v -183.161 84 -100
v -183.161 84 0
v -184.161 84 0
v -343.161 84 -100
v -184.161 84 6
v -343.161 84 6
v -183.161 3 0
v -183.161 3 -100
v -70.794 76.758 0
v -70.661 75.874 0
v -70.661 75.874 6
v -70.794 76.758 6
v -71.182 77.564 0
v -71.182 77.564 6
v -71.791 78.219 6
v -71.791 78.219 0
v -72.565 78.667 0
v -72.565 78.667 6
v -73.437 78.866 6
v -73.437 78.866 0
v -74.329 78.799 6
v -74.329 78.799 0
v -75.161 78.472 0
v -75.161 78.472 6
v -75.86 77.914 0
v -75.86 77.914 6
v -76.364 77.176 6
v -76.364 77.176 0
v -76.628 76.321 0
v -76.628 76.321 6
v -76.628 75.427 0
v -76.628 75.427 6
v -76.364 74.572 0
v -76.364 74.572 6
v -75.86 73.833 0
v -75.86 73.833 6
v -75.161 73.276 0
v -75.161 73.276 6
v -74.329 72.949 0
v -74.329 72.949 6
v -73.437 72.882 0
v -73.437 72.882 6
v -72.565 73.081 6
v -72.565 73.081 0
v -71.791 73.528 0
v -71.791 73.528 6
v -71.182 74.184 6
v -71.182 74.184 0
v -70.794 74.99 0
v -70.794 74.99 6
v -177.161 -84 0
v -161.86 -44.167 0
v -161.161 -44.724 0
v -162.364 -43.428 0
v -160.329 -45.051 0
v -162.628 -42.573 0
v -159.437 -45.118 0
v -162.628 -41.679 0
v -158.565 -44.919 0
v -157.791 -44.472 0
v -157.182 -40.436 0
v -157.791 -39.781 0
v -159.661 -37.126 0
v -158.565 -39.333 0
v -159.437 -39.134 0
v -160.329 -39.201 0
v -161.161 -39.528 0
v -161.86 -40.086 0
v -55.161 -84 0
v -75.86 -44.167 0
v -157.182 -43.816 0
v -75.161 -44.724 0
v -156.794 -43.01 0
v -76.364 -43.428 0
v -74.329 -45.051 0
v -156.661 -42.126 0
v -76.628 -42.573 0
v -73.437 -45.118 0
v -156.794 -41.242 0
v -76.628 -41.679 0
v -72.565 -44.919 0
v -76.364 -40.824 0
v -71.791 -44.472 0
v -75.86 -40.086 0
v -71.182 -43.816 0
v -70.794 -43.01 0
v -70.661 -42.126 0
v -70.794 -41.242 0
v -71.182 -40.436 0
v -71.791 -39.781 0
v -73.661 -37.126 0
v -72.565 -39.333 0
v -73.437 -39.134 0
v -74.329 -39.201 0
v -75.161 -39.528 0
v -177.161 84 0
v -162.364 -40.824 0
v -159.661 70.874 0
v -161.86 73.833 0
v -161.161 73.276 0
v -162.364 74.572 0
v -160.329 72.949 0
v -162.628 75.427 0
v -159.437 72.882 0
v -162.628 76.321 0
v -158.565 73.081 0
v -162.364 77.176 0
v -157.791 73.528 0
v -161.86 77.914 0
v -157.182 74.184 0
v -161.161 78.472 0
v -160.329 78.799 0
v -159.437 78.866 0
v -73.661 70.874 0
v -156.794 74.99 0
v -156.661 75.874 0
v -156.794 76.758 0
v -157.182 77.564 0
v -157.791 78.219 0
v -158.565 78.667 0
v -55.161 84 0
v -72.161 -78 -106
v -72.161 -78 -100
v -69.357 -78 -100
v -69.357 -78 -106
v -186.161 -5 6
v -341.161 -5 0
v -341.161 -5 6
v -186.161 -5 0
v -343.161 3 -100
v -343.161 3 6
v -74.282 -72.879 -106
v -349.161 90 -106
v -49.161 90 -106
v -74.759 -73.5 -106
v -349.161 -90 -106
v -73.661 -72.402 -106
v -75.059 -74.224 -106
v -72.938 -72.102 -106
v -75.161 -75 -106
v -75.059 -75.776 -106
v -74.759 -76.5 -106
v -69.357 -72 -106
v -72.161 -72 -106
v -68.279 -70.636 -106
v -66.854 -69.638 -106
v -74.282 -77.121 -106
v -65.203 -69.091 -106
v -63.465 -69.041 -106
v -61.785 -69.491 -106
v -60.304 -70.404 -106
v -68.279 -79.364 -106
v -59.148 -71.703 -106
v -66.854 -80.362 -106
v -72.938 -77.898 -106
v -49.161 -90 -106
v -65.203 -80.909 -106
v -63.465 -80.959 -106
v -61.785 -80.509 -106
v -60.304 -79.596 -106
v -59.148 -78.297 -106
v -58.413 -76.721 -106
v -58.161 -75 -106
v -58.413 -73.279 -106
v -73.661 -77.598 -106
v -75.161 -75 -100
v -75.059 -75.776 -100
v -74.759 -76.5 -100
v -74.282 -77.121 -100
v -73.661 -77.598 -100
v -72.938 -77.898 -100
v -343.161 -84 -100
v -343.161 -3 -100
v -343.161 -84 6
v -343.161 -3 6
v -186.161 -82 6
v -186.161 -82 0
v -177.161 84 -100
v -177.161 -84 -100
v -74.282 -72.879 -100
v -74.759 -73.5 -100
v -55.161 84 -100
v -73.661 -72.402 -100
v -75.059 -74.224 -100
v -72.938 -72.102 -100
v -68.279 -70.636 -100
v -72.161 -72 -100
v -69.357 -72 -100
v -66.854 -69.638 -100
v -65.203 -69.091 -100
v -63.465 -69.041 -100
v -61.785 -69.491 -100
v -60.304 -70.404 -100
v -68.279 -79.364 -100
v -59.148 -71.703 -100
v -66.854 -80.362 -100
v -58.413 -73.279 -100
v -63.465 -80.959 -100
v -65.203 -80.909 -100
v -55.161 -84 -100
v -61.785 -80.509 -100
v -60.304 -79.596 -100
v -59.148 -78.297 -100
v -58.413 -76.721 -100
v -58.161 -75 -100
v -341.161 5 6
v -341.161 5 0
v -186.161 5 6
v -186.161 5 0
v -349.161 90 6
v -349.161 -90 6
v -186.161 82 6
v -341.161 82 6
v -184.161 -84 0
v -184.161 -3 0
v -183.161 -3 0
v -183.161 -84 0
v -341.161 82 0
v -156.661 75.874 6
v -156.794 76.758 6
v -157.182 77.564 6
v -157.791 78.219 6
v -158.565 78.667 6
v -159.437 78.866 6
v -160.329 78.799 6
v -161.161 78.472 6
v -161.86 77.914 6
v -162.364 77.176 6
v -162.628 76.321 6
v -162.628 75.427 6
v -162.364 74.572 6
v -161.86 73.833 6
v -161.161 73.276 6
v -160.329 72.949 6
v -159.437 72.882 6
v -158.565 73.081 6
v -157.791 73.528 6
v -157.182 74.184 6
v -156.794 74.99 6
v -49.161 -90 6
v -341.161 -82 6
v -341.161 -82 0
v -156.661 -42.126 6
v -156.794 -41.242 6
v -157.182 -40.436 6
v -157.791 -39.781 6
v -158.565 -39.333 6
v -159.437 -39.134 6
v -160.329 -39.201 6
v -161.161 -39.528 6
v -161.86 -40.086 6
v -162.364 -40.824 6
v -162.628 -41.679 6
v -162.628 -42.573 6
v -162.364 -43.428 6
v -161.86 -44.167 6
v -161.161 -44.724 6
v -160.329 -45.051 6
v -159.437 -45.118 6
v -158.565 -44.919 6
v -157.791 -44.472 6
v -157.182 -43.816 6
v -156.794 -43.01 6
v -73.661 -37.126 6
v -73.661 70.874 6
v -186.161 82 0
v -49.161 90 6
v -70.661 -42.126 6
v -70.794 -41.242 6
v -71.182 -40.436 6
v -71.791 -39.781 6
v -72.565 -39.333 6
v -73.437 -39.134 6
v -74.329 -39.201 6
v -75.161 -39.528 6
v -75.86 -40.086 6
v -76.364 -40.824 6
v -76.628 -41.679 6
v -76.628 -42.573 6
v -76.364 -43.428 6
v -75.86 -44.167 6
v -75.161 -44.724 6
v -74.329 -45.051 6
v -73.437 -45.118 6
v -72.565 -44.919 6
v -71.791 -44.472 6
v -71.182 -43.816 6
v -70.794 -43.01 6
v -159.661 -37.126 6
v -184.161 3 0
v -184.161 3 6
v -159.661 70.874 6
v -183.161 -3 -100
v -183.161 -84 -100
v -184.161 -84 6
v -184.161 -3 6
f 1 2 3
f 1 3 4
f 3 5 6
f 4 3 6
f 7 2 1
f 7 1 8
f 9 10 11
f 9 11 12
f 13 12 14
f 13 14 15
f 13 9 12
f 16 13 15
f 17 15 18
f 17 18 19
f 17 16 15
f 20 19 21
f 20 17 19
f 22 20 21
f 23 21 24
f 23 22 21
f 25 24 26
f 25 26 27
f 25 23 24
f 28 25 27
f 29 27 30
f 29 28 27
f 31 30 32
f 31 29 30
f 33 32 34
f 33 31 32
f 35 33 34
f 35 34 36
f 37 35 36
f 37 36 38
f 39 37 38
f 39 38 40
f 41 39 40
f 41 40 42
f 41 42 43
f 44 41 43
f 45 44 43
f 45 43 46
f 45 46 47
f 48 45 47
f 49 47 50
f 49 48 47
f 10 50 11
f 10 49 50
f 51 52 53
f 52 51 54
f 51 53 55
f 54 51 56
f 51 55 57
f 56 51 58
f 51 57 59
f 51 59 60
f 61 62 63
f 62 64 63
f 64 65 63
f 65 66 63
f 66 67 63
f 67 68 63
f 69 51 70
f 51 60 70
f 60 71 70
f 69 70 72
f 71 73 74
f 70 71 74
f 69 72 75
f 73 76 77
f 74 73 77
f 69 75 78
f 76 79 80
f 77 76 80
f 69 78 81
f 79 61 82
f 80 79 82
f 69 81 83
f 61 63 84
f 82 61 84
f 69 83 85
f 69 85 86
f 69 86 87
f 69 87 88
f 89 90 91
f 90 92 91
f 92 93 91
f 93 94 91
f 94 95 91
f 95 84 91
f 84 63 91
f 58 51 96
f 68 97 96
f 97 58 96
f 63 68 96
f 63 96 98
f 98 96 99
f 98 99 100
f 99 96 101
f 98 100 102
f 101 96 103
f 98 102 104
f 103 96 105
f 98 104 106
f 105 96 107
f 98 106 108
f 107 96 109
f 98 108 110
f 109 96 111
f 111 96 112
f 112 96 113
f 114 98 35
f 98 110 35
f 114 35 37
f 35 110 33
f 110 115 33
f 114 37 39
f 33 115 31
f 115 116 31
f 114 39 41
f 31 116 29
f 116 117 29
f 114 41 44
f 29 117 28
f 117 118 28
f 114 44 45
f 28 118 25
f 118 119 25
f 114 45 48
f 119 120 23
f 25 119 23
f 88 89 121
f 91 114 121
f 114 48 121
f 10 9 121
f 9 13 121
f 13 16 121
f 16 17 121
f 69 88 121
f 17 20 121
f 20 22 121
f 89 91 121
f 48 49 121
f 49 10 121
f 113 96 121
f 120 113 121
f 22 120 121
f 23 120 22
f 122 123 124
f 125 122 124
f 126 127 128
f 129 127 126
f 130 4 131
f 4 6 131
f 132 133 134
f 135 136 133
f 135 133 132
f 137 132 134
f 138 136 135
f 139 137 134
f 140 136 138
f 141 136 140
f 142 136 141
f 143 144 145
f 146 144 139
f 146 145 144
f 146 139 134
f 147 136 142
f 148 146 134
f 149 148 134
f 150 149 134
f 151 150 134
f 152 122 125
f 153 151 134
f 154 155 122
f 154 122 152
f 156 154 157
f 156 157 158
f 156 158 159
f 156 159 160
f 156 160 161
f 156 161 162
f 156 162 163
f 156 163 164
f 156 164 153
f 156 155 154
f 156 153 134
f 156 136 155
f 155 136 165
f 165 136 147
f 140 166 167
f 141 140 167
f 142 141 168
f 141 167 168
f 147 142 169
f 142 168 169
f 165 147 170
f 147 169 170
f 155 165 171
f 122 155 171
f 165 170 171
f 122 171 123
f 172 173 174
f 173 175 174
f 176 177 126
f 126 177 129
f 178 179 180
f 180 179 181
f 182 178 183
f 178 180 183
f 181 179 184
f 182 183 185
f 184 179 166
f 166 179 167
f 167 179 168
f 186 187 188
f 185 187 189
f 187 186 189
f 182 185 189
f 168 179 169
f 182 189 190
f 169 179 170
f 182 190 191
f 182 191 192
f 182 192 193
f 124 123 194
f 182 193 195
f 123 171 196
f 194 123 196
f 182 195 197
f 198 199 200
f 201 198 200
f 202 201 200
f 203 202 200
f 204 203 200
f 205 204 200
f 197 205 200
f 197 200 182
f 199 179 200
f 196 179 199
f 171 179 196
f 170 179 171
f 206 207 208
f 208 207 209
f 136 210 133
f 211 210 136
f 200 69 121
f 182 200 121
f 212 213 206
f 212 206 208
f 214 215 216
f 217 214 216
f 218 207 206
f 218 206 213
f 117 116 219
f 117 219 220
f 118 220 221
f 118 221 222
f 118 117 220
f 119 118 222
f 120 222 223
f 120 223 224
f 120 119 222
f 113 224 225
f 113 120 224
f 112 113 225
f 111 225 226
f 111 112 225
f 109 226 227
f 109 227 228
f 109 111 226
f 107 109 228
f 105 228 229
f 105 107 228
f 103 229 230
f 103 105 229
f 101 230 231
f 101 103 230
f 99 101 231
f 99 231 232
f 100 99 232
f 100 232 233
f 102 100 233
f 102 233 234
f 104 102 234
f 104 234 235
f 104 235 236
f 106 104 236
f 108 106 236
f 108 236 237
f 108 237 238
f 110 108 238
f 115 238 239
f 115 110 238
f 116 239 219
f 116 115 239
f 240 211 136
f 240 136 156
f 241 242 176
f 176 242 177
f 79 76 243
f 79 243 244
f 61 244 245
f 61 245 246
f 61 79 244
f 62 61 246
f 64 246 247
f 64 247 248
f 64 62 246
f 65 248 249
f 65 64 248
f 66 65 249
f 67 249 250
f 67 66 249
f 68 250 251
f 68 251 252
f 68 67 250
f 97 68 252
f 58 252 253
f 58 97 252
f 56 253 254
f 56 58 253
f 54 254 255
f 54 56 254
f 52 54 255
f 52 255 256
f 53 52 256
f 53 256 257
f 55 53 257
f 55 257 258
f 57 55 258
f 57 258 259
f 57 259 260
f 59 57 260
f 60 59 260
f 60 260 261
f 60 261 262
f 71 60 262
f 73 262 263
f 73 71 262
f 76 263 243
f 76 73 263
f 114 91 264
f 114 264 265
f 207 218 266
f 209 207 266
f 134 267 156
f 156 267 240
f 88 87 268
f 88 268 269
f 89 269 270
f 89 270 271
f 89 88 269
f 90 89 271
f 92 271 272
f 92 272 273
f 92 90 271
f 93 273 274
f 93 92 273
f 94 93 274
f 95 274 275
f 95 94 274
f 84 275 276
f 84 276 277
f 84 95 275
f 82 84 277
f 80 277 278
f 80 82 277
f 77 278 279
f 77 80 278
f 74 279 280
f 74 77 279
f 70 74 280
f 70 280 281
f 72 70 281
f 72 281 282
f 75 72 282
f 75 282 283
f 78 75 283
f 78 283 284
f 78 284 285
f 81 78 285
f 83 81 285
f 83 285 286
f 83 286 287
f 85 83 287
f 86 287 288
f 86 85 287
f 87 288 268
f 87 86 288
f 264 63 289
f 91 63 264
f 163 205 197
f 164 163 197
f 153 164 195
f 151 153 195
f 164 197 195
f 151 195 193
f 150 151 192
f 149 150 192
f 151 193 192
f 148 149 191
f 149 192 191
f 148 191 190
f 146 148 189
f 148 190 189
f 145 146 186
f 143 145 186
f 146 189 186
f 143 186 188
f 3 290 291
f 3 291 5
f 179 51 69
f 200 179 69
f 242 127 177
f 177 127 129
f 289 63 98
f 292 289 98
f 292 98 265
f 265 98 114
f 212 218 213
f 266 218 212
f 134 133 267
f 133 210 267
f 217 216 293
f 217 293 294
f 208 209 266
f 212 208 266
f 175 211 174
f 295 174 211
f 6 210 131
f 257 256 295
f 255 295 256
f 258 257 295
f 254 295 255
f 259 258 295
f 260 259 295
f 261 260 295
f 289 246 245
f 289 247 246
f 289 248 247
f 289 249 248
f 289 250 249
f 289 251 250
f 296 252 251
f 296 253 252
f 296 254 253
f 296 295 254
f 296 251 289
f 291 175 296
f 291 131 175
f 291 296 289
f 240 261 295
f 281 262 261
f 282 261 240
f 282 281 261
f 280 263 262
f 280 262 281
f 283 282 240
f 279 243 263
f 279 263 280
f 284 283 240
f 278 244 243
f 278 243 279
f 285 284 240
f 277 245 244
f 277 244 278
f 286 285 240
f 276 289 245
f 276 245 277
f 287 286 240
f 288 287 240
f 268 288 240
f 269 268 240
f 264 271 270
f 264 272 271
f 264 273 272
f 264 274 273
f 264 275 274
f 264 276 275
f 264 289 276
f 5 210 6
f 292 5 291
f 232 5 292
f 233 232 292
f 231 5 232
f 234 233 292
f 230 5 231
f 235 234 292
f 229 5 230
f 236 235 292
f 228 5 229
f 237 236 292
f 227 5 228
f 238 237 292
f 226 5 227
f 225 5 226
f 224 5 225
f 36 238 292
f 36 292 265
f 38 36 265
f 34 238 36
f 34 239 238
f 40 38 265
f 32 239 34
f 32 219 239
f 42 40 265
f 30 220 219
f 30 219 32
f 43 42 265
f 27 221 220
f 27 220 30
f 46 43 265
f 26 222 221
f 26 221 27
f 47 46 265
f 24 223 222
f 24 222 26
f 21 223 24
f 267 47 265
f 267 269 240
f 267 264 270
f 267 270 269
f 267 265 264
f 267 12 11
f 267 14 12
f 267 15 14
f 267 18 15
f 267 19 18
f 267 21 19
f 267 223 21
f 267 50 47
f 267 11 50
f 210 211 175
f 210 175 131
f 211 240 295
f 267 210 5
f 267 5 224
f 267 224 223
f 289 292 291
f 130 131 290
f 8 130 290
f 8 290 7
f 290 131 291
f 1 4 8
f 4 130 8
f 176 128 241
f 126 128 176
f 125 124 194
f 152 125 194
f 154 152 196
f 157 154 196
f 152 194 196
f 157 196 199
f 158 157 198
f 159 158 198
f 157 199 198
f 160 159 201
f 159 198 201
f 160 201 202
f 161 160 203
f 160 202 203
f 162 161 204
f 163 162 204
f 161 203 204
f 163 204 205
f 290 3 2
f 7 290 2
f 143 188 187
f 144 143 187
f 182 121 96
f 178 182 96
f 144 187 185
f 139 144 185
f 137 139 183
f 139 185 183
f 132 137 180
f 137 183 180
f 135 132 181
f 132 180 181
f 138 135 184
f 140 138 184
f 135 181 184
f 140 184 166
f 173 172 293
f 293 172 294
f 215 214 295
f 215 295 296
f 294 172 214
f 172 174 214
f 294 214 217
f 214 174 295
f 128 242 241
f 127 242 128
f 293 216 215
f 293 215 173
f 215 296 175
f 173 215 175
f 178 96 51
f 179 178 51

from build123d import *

# Parameters (mm, degrees)
F0_W     = 155
F0_H     = 77
F1_DEPTH = 6
F0_W_2   = 300
F0_H_2   = 180
F0_W_3   = 159
F0_H_3   = 81
F0_R     = 3
F0_W_4   = 86
F0_H_4   = 108
F2_W     = 300
F2_H     = 180
F2_W_2   = 6
F2_H_2   = 81
F2_H_3   = 6
F3_DEPTH = 100
F4_W     = 300
F4_H     = 180
F5_DEPTH = 6


with BuildPart() as f1:
    # F0 (on Top) → F1 (new body)
    with BuildSketch(Plane.XY):
        with Locations((-263.6611738205, 43.5)):
            Rectangle(F0_W, F0_H)
    extrude(amount=F1_DEPTH)


with BuildPart() as f1b:
    # F0 (on Top) → F1, piece 2 (new body)
    with BuildSketch(Plane.XY):
        with Locations((-263.6611738205, -43.5)):
            Rectangle(F0_W, F0_H)
    extrude(amount=F1_DEPTH)


with BuildPart() as f1c:
    # F0 (on Top) → F1, piece 3 (new body)
    with BuildSketch(Plane.XY):
        with Locations((-199.1611738205, 0)):
            Rectangle(F0_W_2, F0_H_2)
        with Locations((-263.6611738205, -43.5)):
            Rectangle(F0_W_3, F0_H_3, mode=Mode.SUBTRACT)
        with Locations((-159.6611738205, -42.1260297298)):
            Circle(F0_R, mode=Mode.SUBTRACT)
        with Locations((-73.6611738205, -42.1260297298)):
            Circle(F0_R, mode=Mode.SUBTRACT)
        with Locations((-263.6611738205, 43.5)):
            Rectangle(F0_W_3, F0_H_3, mode=Mode.SUBTRACT)
        with Locations((-116.6611738205, 16.8739702702)):
            Rectangle(F0_W_4, F0_H_4, mode=Mode.SUBTRACT)
        with Locations((-159.6611738205, 75.8739702702)):
            Circle(F0_R, mode=Mode.SUBTRACT)
        with Locations((-73.6611738205, 75.8739702702)):
            Circle(F0_R, mode=Mode.SUBTRACT)
    extrude(amount=F1_DEPTH)

    # F2 (on face) → F3 (join)
    with BuildSketch(Plane(origin=(0, 0, 0), x_dir=(1, 0, 0), z_dir=(0, 0, -1))):
        with Locations((-199.1611738205, 0)):
            Rectangle(F2_W, F2_H)
        Polygon((-343.1611738205, -84), (-343.1611738205, -3), (-343.1611738205, 3), (-343.1611738205, 84), (-184.1611738205, 84), (-183.1611738205, 84), (-177.1611738205, 84), (-55.1611738205, 84), (-55.1611738205, -84), (-177.1611738205, -84), (-183.1611738205, -84), (-184.1611738205, -84), align=None, mode=Mode.SUBTRACT)
        Polygon((-343.1611738205, -3), (-184.1611738205, -3), (-183.1611738205, -3), (-183.1611738205, 3), (-184.1611738205, 3), (-343.1611738205, 3), align=None)
        with Locations((-180.1611738205, 43.5)):
            Rectangle(F2_W_2, F2_H_2)
        with Locations((-180.1611738205, -43.5)):
            Rectangle(F2_W_2, F2_H_2)
        with Locations((-180.1611738205, 0)):
            Rectangle(F2_W_2, F2_H_3)
    extrude(amount=F3_DEPTH)

    # F4 (on face) → F5 (join)
    with BuildSketch(Plane(origin=(0, 0, -100), x_dir=(1, 0, 0), z_dir=(0, 0, -1))):
        with Locations((-199.1611738205, 0)):
            Rectangle(F4_W, F4_H)
        with BuildLine():
            ThreePointArc((-69.3573262432, 78), (-62.6082595499, 80.7955549577), (-58.1611738205, 75))
            ThreePointArc((-58.1611738205, 75), (-62.6082595499, 69.2044450423), (-69.3573262432, 72))
            Line((-69.3573262432, 72), (-72.1611738205, 72))
            ThreePointArc((-72.1611738205, 72), (-74.2824941641, 72.8786796564), (-75.1611738205, 75))
            ThreePointArc((-75.1611738205, 75), (-74.2824941641, 77.1213203436), (-72.1611738205, 78))
            Line((-72.1611738205, 78), (-69.3573262432, 78))
        make_face(mode=Mode.SUBTRACT)
    extrude(amount=F5_DEPTH)


solid = Compound([f1.part, f1b.part, f1c.part])
